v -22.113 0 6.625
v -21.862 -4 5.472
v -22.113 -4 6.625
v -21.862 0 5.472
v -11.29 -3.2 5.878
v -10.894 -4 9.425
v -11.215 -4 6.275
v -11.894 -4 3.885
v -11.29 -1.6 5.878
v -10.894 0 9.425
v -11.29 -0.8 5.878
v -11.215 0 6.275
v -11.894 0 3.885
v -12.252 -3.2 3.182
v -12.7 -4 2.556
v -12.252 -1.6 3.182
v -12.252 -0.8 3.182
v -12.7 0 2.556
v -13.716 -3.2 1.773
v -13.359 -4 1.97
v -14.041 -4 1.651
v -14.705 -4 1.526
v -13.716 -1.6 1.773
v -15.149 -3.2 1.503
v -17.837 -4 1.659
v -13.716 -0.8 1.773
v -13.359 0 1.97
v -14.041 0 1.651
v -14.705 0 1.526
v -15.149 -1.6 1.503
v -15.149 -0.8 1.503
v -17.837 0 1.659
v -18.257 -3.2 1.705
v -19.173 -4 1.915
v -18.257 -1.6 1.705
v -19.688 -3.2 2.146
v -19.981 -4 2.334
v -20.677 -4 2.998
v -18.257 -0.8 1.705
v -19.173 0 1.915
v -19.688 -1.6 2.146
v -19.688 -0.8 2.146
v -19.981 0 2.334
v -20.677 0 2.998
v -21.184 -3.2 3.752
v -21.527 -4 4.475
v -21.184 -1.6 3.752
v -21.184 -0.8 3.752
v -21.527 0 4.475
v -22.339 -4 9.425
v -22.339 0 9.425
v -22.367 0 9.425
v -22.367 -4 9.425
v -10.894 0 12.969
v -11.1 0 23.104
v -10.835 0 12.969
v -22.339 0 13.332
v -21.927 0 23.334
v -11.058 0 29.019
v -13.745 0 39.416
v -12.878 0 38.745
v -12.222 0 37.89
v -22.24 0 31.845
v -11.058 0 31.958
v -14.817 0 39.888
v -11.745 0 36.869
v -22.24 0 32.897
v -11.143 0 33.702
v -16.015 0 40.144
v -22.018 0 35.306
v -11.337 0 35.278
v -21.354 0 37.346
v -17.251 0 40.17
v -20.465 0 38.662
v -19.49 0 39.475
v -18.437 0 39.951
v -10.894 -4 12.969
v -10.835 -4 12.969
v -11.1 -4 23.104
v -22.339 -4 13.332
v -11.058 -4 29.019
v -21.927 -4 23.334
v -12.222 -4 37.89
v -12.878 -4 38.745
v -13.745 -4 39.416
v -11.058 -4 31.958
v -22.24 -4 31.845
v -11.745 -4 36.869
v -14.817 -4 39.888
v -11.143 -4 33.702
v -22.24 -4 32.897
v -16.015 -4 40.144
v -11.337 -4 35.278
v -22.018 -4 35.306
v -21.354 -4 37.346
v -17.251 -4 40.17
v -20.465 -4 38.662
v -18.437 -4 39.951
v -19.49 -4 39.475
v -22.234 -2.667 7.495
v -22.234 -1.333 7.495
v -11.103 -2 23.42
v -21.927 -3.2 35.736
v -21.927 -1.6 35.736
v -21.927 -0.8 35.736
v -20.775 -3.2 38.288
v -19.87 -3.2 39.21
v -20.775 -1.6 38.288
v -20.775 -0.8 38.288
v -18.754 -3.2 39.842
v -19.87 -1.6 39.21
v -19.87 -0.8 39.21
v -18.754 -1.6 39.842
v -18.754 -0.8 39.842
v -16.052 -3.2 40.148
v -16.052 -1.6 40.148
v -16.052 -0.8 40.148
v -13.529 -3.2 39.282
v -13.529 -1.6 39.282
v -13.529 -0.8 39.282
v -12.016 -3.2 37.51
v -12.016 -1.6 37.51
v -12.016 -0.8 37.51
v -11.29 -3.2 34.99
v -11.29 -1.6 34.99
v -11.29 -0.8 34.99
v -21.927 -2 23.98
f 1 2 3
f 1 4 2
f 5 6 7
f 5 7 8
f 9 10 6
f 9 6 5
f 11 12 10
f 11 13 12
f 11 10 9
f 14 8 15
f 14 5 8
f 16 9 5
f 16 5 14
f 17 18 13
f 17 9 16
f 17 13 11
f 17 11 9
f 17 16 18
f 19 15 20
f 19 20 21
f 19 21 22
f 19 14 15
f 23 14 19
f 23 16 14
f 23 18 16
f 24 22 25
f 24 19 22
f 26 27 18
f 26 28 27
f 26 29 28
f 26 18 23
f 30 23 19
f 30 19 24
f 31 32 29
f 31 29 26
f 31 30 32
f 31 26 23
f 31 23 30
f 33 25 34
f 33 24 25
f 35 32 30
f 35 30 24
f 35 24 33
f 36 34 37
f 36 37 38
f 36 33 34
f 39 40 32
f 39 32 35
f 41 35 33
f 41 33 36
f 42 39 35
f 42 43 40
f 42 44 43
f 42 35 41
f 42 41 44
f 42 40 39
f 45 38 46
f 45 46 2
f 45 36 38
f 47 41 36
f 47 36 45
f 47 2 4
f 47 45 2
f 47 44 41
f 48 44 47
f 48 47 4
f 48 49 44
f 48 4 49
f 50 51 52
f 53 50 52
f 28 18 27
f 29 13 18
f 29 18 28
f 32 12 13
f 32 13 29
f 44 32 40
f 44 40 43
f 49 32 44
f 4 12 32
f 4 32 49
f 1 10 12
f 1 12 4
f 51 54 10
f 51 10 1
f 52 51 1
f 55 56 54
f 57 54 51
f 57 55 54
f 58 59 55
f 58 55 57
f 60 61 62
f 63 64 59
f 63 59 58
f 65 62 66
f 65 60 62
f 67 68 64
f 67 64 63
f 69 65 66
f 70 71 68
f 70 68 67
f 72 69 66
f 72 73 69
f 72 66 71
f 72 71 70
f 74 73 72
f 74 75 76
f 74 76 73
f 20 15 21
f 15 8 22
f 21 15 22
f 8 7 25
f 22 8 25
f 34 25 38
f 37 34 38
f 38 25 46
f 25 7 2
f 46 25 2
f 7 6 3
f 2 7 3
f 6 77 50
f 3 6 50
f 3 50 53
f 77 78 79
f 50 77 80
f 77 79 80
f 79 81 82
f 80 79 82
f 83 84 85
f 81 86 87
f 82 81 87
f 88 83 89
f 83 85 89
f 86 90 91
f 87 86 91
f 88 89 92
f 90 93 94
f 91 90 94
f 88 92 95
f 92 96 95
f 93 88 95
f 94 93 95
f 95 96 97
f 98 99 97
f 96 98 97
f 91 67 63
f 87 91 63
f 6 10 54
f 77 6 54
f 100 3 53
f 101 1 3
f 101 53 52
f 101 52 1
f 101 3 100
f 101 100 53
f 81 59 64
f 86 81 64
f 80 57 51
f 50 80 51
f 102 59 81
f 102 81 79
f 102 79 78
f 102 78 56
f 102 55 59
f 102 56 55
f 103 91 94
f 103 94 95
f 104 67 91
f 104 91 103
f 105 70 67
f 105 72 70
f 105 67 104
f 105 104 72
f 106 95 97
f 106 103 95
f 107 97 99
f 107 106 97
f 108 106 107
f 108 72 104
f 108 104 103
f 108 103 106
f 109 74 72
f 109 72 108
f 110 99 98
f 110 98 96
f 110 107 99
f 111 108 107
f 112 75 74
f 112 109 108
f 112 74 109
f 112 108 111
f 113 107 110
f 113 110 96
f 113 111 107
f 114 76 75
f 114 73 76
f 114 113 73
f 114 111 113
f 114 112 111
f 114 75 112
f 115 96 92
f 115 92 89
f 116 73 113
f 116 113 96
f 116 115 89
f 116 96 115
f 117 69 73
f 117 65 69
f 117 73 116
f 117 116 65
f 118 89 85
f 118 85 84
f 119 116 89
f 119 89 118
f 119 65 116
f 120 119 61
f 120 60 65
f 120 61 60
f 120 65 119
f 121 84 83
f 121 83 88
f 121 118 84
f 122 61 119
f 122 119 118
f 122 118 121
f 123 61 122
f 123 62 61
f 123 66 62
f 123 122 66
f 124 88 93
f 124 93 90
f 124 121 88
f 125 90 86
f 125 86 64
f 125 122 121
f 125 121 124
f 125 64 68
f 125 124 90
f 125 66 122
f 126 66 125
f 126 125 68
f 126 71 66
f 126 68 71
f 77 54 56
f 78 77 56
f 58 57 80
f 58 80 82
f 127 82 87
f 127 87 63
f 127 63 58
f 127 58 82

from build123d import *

# Parameters (mm, degrees)
F1_DEPTH = 4


with BuildPart() as f1:
    # F0 (on Front) → F1 (new body)
    with BuildSketch(Plane.XZ):
        with BuildLine():
            add(Edge.make_bspline(
                [(-10.8941382348, 9.4249713676), (-10.9593211957, 8.1055708545), (-11.3477292709, 4.2913613907), (-13.2729236116, 1.1880596782), (-16.7178638936, 1.6640416375), (-20.1538820528, 1.6359164321), (-21.7196768364, 4.2894851093), (-22.1134480089, 6.6247042269)],
                knots=[0.7013699909, 0.7013699909, 0.7013699909, 0.7013699909, 0.7350663126, 0.8081776347, 0.8660857742, 0.9244394022, 1, 1, 1, 1], degree=3))
            Line((-10.8941382348, 9.4249713676), (-10.8941382348, 12.969491072))
            Line((-10.8941382348, 12.969491072), (-10.8346360621, 12.969491072))
            add(Edge.make_bspline(
                [(-11.0579359967, 29.0188053732), (-11.0813696856, 27.3231476575), (-11.1960917274, 22.442331008), (-10.8611217361, 16.3784642244), (-10.8346360621, 12.969491072)],
                knots=[0.5465043835, 0.5465043835, 0.5465043835, 0.5465043835, 0.5948390255, 0.6729776906, 0.6729776906, 0.6729776906, 0.6729776906], degree=3))
            Line((-11.0579359967, 29.0188053732), (-11.0579359967, 31.9577415271))
            add(Edge.make_bspline(
                [(-22.2400677926, 32.8968483147), (-22.219678178, 33.9271365284), (-21.9328643092, 37.0325836444), (-19.2953175937, 40.7363202728), (-12.82271139, 39.9594736957), (-11.2841805411, 36.1486290506), (-11.0833476746, 33.0599837515), (-11.0579359967, 31.9577415271)],
                knots=[0.2207874367, 0.2207874367, 0.2207874367, 0.2207874367, 0.2542754597, 0.3305362265, 0.4072855601, 0.4809503604, 0.5167544975, 0.5167544975, 0.5167544975, 0.5167544975], degree=3))
            Line((-22.2400677926, 32.8968483147), (-22.2400677926, 31.8454611102))
            add(Edge.make_bspline(
                [(-22.3392057409, 13.3318323754), (-22.2160715083, 16.7804599134), (-21.6434749076, 23.9259584444), (-22.2012087974, 29.5712444241), (-22.2400677926, 31.8454611102)],
                knots=[0.059138091, 0.059138091, 0.059138091, 0.059138091, 0.1394794972, 0.2096900213, 0.2096900213, 0.2096900213, 0.2096900213], degree=3))
            Line((-22.3392057409, 13.3318323754), (-22.3392057409, 9.4249713676))
            Line((-22.3392057409, 9.4249713676), (-22.3673229857, 9.4249713676))
            add(Edge.make_bspline(
                [(-22.1134480089, 6.6247042269), (-22.2544308378, 7.4607882785), (-22.3326375011, 8.4042871625), (-22.3673229857, 9.4249713676)],
                knots=[0, 0, 0, 0, 0.0270531404, 0.0270531404, 0.0270531404, 0.0270531404], degree=3))
        make_face()
    extrude(amount=F1_DEPTH)


solid = f1.part
